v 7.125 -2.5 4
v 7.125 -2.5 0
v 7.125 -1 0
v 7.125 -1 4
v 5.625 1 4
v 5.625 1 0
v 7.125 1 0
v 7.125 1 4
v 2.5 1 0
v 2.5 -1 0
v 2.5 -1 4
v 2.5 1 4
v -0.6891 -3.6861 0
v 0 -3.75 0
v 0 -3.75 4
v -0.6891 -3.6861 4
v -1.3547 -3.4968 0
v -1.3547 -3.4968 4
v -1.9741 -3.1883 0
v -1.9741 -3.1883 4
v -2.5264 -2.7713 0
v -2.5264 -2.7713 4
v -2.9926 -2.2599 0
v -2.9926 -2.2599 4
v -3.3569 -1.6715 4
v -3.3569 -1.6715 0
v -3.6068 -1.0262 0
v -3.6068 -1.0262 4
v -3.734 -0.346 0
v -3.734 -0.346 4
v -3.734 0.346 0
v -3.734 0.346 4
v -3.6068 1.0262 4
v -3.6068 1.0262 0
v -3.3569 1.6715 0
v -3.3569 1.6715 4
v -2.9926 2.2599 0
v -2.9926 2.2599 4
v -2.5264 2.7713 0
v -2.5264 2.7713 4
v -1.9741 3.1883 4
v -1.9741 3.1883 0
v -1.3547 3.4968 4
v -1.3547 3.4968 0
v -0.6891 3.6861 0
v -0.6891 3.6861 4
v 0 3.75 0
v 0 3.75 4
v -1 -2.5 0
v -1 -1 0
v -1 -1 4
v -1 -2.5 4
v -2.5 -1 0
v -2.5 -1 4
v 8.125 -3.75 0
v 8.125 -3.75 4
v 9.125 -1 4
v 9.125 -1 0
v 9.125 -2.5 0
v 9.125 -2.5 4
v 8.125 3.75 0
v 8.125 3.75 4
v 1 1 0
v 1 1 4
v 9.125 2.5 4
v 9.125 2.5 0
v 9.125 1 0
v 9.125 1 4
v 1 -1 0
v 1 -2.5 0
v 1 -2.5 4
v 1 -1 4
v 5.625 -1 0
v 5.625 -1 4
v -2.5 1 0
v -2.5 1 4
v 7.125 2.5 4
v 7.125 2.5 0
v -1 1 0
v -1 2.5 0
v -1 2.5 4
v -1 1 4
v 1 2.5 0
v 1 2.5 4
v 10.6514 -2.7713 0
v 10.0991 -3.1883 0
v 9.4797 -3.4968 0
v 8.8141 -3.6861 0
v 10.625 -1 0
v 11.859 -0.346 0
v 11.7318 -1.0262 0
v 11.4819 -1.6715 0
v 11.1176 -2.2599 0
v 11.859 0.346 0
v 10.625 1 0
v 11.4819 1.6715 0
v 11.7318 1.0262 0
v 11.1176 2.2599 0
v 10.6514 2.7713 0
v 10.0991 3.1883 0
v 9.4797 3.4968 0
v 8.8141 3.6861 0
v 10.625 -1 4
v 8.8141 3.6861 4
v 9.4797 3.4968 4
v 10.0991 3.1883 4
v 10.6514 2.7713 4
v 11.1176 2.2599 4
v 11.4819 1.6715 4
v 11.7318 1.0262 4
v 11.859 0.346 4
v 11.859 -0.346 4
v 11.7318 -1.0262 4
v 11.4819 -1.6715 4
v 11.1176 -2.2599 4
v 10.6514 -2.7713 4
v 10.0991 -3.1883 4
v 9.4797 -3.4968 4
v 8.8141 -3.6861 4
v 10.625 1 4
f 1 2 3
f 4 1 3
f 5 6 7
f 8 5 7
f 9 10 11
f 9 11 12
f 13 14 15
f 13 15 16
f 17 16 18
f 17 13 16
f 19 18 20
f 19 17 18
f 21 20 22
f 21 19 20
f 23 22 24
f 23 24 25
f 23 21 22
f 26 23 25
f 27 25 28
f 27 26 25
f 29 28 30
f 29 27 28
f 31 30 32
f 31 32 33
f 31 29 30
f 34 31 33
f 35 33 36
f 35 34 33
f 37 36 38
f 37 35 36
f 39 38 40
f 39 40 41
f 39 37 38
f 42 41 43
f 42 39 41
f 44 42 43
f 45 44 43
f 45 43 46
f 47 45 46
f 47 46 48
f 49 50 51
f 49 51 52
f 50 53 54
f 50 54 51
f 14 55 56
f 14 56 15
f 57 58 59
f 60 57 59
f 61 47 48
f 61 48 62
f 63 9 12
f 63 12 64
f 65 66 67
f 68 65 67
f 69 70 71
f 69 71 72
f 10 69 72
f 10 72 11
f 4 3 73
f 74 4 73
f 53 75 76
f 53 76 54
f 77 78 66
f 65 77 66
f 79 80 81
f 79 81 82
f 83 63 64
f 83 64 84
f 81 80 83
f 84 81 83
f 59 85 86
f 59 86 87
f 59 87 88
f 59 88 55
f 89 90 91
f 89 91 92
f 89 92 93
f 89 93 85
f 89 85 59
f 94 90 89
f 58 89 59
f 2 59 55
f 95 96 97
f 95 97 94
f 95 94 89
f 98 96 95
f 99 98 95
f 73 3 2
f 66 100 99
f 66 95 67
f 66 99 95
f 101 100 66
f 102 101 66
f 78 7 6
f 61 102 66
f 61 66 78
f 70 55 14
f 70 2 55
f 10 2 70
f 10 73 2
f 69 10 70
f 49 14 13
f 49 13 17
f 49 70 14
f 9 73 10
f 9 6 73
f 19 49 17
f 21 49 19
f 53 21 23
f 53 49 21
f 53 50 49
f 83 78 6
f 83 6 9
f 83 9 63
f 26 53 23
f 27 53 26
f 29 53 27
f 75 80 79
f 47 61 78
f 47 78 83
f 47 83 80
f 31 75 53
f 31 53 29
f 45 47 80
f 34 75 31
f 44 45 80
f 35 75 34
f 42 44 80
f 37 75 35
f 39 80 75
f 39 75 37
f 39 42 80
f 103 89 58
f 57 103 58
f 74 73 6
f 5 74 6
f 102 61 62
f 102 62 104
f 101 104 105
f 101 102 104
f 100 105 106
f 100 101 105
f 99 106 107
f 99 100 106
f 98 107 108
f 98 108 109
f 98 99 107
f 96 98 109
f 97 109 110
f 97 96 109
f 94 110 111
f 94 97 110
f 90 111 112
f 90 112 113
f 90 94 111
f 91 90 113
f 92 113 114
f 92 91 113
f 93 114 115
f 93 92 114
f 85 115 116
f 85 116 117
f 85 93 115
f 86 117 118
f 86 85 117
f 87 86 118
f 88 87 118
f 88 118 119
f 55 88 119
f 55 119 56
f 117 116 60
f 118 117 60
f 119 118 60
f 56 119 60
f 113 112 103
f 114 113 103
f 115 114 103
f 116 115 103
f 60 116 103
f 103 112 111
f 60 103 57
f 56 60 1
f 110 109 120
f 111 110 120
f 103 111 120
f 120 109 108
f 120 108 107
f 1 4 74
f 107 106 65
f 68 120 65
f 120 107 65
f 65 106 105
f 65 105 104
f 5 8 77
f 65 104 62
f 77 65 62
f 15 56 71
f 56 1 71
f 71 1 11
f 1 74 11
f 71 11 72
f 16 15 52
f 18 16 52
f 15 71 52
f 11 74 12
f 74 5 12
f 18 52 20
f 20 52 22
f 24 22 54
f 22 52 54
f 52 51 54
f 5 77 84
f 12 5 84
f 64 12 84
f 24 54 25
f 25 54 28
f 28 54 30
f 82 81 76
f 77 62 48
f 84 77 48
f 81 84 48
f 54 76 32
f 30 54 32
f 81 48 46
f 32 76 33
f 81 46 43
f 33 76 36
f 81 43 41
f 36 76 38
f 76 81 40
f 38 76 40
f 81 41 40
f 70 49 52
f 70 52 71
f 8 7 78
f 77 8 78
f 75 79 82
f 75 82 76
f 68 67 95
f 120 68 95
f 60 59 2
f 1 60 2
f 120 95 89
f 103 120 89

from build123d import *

# Parameters (mm, degrees)
BOSS_EXTRUDE1_DEPTH = 4


with BuildPart() as part:
    # Sketch1 → Boss-Extrude1 (new body)
    with BuildSketch(Plane.XY):
        with BuildLine():
            Line((0, 3.75), (8.125, 3.75))
            ThreePointArc((8.125, 3.75), (11.875, 0), (8.125, -3.75))
            Line((8.125, -3.75), (0, -3.75))
            ThreePointArc((0, -3.75), (-3.75, 0), (0, 3.75))
        make_face()
        Polygon((8.125, 2.5), (9.125, 2.5), (9.125, 1), (10.625, 1), (10.625, -1), (9.125, -1), (9.125, -2.5), (7.125, -2.5), (7.125, -1), (5.625, -1), (5.625, 1), (7.125, 1), (7.125, 2.5), align=None, mode=Mode.SUBTRACT)
        Polygon((1, 1), (1, 2.5), (0, 2.5), (-1, 2.5), (-1, 1), (-2.5, 1), (-2.5, -1), (-1, -1), (-1, -2.5), (1, -2.5), (1, -1), (2.5, -1), (2.5, 1), align=None, mode=Mode.SUBTRACT)
    extrude(amount=BOSS_EXTRUDE1_DEPTH)


solid = part.part
